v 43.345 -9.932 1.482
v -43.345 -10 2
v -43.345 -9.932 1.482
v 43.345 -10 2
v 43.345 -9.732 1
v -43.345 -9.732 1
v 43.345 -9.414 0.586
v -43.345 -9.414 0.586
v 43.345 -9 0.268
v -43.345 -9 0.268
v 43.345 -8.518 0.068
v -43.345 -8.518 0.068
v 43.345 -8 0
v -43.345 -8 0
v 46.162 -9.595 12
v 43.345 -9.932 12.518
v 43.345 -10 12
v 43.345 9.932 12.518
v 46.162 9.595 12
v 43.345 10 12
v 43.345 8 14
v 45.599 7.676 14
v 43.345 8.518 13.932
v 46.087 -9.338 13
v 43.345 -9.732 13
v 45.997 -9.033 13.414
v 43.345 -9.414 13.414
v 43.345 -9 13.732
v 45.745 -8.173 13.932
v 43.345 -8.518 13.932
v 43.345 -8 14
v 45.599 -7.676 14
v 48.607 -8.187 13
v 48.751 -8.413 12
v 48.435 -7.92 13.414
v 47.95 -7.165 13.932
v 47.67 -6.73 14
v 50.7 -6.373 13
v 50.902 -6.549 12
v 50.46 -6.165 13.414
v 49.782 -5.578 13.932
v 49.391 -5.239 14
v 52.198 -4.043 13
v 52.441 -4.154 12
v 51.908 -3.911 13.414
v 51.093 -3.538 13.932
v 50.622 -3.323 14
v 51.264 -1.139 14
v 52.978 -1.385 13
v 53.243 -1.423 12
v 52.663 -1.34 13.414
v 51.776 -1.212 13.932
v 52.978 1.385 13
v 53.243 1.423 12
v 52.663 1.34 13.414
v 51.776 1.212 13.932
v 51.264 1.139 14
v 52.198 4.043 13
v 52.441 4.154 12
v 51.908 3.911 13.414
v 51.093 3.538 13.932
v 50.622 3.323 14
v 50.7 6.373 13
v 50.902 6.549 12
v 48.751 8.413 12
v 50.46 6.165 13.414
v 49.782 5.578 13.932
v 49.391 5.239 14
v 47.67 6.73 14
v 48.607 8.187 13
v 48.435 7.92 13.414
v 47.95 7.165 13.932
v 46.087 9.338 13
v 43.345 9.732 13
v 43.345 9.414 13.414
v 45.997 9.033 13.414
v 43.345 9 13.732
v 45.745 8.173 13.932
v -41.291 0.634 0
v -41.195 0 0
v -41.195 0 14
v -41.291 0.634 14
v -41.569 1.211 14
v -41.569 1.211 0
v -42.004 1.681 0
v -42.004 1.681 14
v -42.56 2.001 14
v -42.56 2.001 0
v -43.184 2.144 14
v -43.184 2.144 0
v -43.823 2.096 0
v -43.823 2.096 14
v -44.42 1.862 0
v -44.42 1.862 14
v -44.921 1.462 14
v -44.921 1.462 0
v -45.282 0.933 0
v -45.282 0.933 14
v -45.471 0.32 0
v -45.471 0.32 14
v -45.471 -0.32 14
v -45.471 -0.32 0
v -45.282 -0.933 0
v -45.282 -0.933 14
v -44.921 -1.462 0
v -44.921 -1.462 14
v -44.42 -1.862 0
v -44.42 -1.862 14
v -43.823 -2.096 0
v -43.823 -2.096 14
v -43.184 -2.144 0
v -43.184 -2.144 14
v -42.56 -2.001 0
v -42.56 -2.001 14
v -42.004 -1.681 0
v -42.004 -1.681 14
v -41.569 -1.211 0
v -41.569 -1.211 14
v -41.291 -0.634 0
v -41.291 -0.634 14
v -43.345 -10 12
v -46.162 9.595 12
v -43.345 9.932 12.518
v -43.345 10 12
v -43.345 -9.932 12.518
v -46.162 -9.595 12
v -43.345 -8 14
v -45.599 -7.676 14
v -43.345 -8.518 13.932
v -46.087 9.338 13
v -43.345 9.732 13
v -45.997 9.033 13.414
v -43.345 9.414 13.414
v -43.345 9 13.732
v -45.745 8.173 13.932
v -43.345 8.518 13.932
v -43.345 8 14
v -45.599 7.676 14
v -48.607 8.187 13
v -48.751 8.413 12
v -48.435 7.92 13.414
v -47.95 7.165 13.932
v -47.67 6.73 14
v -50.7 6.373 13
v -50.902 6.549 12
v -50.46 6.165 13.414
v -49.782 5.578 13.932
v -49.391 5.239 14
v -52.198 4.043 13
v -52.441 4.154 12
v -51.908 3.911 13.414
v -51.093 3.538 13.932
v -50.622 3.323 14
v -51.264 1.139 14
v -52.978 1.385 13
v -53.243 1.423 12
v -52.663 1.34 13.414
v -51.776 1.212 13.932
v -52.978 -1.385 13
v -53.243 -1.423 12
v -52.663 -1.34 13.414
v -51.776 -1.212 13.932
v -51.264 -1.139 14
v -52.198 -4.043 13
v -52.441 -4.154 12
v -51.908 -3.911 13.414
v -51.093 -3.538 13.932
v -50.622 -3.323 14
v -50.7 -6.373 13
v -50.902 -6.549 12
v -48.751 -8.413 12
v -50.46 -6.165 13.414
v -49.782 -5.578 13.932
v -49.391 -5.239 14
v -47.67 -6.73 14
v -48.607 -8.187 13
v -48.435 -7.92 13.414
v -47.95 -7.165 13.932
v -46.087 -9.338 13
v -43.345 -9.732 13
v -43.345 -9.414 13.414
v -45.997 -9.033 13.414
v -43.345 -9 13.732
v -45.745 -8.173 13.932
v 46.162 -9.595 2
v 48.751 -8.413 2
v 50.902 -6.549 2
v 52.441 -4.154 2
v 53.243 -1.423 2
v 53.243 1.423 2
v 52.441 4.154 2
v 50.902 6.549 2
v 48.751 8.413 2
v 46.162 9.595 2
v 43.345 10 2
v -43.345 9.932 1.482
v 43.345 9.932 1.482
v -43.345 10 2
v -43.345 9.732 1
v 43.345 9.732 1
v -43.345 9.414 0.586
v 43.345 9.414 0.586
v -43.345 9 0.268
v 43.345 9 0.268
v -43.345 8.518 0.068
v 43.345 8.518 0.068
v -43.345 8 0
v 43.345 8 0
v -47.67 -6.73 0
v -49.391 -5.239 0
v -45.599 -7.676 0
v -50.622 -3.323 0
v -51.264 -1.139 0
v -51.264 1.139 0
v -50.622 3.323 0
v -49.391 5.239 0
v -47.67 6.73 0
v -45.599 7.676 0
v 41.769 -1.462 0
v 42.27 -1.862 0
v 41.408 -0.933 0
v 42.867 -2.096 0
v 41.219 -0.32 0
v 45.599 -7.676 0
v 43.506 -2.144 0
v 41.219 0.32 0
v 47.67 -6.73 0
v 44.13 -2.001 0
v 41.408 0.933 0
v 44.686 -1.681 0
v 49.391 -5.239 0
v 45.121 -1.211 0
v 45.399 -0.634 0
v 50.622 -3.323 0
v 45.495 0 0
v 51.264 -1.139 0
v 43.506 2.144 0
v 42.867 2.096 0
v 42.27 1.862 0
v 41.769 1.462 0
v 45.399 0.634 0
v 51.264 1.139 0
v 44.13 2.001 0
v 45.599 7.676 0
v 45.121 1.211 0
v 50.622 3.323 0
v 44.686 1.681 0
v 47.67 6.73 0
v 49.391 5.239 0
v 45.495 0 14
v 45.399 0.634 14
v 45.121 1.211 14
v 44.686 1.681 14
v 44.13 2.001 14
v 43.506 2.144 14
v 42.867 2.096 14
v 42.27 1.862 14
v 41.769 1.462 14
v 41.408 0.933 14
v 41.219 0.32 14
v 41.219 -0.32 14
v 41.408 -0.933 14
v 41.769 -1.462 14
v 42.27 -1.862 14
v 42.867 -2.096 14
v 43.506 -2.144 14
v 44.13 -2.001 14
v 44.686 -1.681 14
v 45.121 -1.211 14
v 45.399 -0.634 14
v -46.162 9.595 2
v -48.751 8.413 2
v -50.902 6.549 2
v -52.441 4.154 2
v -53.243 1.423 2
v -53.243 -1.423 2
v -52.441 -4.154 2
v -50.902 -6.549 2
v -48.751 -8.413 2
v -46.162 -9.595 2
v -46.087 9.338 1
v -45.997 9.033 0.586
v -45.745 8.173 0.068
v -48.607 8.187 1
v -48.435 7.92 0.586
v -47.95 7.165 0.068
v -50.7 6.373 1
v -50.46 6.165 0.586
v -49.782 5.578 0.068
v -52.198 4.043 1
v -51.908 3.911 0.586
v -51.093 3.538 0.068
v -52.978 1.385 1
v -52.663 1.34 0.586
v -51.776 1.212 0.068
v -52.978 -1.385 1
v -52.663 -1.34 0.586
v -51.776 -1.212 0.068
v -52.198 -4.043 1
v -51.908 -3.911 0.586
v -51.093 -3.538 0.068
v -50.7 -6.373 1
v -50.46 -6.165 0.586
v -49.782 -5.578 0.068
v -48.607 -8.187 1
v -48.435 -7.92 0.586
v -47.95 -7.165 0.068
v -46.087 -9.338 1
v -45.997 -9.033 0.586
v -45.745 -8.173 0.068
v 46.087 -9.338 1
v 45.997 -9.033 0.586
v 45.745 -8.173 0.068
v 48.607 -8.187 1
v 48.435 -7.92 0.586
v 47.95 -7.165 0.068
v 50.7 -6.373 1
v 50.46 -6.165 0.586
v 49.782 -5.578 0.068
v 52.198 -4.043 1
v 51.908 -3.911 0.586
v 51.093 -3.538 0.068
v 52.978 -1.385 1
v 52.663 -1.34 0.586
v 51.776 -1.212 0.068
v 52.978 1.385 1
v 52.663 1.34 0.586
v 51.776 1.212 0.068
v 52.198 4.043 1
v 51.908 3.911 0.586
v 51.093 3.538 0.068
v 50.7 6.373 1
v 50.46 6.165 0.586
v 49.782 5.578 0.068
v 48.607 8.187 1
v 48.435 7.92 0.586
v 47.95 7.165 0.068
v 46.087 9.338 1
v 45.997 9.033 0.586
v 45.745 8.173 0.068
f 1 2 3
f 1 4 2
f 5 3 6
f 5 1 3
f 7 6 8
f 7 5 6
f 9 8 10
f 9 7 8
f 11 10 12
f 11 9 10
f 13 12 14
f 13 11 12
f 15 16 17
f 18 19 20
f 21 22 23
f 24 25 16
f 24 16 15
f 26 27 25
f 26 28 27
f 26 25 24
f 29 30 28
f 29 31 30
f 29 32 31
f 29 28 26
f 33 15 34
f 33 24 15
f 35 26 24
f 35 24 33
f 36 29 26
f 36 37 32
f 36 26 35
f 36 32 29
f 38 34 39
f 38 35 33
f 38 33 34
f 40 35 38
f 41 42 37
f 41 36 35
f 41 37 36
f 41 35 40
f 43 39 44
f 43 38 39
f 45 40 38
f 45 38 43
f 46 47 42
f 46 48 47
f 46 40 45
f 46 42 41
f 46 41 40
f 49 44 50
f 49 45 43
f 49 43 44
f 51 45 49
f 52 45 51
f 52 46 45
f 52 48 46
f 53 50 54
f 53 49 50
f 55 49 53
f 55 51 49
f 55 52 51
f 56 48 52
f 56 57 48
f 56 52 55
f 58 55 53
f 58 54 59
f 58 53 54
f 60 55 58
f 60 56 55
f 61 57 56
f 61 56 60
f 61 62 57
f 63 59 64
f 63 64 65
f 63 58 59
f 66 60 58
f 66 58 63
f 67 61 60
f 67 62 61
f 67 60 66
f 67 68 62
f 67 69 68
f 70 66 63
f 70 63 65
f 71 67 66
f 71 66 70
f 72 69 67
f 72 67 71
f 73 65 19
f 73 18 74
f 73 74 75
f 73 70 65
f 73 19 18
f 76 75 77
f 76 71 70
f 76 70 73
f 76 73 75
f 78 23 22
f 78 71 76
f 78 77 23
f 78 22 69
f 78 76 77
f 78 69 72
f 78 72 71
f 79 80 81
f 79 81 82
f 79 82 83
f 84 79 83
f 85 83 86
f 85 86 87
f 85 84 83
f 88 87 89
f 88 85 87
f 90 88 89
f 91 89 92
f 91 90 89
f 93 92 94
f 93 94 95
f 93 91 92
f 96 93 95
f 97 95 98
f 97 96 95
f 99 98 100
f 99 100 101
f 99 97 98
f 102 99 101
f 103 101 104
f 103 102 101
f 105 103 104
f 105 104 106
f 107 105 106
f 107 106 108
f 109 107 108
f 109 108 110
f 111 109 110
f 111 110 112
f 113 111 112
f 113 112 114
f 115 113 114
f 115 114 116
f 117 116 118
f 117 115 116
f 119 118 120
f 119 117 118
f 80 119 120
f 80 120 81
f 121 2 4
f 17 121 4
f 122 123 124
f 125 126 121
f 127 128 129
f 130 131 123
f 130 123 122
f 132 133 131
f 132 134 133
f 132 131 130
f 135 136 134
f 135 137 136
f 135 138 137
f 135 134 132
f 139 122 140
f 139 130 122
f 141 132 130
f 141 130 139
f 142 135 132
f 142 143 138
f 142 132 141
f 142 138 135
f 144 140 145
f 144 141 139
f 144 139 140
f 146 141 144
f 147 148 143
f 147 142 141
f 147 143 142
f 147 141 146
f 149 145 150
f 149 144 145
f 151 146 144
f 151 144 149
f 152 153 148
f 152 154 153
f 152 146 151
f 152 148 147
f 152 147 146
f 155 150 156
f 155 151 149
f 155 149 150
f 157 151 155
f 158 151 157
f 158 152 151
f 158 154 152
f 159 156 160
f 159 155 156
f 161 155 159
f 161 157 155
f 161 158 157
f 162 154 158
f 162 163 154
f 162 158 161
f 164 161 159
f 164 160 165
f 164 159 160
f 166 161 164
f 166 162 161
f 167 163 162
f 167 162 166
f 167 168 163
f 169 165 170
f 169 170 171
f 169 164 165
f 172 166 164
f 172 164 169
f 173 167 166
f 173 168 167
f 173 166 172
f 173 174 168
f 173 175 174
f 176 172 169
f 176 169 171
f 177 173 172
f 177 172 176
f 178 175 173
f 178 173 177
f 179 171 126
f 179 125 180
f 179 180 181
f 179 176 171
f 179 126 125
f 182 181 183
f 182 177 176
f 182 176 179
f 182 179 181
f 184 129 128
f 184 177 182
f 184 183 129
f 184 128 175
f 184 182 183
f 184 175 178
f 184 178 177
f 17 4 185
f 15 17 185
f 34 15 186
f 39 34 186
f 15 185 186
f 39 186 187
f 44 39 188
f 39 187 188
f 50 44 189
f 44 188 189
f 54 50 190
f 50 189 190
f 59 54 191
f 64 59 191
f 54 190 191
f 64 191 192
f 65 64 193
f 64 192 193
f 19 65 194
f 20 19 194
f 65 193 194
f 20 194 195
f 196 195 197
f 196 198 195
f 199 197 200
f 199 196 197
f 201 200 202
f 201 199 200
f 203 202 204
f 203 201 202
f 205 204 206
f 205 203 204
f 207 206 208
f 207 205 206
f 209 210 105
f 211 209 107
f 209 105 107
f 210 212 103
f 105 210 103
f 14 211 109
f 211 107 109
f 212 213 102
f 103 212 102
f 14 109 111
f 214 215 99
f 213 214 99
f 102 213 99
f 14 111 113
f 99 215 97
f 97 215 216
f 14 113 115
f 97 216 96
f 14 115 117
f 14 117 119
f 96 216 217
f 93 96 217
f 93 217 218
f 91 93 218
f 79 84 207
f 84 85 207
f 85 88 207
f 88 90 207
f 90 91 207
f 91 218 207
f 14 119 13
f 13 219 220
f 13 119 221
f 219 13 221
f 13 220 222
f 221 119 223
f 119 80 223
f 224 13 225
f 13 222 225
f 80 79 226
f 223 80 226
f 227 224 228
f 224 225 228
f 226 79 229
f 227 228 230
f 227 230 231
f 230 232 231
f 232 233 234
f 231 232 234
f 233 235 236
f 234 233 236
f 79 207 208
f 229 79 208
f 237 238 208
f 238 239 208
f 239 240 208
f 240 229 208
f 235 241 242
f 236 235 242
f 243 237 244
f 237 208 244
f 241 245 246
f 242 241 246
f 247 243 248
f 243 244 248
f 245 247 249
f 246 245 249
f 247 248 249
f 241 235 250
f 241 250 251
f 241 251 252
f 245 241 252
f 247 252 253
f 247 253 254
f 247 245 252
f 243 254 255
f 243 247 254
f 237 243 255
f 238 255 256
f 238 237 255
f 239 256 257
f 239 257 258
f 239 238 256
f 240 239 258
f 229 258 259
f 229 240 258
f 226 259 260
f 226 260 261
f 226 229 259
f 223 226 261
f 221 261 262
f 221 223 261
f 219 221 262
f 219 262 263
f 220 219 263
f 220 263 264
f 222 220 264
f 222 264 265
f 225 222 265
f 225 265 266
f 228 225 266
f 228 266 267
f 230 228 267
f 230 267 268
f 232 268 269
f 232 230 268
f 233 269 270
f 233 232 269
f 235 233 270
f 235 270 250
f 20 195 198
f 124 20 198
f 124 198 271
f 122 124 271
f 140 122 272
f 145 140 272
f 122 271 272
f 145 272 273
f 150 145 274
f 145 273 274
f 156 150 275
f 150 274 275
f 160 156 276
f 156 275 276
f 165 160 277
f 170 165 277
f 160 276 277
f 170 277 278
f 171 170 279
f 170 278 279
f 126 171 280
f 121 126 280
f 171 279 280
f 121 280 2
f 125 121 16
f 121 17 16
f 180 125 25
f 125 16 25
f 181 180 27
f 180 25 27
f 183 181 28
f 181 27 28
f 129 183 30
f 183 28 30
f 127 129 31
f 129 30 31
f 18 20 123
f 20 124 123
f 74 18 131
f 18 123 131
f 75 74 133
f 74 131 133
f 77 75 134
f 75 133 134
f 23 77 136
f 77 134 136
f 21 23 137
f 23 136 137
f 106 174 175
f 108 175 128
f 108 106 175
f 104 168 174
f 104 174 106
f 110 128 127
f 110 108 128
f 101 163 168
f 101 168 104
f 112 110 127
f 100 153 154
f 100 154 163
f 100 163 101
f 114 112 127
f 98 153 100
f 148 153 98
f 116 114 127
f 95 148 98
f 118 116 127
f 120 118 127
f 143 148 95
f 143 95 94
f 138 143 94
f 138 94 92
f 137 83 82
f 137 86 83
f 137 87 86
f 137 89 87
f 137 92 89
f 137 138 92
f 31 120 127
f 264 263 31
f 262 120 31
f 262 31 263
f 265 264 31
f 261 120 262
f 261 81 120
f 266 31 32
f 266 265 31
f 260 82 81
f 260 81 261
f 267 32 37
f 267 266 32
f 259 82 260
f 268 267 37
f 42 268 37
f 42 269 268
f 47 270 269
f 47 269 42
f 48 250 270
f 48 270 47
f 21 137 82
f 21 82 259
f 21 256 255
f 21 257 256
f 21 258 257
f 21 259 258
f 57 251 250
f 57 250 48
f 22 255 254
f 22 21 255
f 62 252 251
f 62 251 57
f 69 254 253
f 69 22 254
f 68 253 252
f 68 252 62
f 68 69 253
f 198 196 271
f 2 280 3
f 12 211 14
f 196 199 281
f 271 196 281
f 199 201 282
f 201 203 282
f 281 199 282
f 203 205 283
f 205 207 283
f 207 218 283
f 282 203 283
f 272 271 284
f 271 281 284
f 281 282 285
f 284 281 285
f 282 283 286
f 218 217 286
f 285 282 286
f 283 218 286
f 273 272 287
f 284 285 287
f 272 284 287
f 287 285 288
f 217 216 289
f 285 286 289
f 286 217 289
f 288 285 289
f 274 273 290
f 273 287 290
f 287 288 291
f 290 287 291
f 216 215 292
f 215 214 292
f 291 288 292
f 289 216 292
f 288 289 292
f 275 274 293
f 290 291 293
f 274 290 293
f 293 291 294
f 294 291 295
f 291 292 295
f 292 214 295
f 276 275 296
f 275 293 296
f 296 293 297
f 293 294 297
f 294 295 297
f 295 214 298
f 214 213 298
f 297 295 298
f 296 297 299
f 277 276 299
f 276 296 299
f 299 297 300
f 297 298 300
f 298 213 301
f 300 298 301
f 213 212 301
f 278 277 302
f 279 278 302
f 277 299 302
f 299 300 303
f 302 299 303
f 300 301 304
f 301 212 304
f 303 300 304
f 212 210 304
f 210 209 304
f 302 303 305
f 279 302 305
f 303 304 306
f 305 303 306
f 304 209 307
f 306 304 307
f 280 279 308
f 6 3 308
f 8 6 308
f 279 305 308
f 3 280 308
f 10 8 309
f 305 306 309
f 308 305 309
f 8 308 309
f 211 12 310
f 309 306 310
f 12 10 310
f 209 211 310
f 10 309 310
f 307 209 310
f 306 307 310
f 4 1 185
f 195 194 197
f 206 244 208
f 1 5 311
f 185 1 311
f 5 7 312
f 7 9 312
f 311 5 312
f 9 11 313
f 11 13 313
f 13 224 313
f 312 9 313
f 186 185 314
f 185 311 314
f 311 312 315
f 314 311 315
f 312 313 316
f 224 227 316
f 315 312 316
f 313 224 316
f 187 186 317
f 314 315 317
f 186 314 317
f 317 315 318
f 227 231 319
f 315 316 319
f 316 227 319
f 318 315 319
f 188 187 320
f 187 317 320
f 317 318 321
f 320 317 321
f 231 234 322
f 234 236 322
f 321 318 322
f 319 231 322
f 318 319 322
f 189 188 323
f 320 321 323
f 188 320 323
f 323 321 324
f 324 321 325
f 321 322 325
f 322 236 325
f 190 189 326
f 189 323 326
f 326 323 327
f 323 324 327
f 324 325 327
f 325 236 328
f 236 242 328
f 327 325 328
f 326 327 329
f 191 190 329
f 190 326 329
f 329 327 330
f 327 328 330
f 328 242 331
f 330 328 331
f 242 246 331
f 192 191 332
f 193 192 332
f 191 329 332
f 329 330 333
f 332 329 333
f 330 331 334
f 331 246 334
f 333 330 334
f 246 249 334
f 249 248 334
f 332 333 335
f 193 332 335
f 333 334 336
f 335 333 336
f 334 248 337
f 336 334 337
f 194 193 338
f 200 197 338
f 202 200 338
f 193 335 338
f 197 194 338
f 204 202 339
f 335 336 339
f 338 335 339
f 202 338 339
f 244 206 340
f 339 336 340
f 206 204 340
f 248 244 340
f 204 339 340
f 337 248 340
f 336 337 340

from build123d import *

# Parameters (mm, degrees)
SKETCH1_R           = 2.15
BOSS_EXTRUDE1_DEPTH = 14
FILLET1_R           = 2


with BuildPart() as part:
    # Sketch1 → Boss-Extrude1 (new body)
    with BuildSketch(Plane.XY):
        with BuildLine():
            Line((-43.345, -10), (43.345, -10))
            ThreePointArc((43.345, -10), (53.345, 0), (43.345, 10))
            Line((43.345, 10), (-43.345, 10))
            ThreePointArc((-43.345, 10), (-53.345, 0), (-43.345, -10))
        make_face()
        with Locations((-43.345, 0)):
            Circle(SKETCH1_R, mode=Mode.SUBTRACT)
        with Locations((43.345, 0)):
            Circle(SKETCH1_R, mode=Mode.SUBTRACT)
    extrude(amount=BOSS_EXTRUDE1_DEPTH)

    # Fillet1
    fillet1_edges = [part.edges().sort_by_distance(p)[0] for p in [
        (-53.345, 0, 14),
        (0, -10, 14),
        (53.345, 0, 14),
        (0, -10, 0),
        (-53.345, 0, 0),
        (0, 10, 0),
        (53.345, 0, 0),
        (0, 10, 14),
    ]]
    fillet(fillet1_edges, radius=FILLET1_R)


solid = part.part
